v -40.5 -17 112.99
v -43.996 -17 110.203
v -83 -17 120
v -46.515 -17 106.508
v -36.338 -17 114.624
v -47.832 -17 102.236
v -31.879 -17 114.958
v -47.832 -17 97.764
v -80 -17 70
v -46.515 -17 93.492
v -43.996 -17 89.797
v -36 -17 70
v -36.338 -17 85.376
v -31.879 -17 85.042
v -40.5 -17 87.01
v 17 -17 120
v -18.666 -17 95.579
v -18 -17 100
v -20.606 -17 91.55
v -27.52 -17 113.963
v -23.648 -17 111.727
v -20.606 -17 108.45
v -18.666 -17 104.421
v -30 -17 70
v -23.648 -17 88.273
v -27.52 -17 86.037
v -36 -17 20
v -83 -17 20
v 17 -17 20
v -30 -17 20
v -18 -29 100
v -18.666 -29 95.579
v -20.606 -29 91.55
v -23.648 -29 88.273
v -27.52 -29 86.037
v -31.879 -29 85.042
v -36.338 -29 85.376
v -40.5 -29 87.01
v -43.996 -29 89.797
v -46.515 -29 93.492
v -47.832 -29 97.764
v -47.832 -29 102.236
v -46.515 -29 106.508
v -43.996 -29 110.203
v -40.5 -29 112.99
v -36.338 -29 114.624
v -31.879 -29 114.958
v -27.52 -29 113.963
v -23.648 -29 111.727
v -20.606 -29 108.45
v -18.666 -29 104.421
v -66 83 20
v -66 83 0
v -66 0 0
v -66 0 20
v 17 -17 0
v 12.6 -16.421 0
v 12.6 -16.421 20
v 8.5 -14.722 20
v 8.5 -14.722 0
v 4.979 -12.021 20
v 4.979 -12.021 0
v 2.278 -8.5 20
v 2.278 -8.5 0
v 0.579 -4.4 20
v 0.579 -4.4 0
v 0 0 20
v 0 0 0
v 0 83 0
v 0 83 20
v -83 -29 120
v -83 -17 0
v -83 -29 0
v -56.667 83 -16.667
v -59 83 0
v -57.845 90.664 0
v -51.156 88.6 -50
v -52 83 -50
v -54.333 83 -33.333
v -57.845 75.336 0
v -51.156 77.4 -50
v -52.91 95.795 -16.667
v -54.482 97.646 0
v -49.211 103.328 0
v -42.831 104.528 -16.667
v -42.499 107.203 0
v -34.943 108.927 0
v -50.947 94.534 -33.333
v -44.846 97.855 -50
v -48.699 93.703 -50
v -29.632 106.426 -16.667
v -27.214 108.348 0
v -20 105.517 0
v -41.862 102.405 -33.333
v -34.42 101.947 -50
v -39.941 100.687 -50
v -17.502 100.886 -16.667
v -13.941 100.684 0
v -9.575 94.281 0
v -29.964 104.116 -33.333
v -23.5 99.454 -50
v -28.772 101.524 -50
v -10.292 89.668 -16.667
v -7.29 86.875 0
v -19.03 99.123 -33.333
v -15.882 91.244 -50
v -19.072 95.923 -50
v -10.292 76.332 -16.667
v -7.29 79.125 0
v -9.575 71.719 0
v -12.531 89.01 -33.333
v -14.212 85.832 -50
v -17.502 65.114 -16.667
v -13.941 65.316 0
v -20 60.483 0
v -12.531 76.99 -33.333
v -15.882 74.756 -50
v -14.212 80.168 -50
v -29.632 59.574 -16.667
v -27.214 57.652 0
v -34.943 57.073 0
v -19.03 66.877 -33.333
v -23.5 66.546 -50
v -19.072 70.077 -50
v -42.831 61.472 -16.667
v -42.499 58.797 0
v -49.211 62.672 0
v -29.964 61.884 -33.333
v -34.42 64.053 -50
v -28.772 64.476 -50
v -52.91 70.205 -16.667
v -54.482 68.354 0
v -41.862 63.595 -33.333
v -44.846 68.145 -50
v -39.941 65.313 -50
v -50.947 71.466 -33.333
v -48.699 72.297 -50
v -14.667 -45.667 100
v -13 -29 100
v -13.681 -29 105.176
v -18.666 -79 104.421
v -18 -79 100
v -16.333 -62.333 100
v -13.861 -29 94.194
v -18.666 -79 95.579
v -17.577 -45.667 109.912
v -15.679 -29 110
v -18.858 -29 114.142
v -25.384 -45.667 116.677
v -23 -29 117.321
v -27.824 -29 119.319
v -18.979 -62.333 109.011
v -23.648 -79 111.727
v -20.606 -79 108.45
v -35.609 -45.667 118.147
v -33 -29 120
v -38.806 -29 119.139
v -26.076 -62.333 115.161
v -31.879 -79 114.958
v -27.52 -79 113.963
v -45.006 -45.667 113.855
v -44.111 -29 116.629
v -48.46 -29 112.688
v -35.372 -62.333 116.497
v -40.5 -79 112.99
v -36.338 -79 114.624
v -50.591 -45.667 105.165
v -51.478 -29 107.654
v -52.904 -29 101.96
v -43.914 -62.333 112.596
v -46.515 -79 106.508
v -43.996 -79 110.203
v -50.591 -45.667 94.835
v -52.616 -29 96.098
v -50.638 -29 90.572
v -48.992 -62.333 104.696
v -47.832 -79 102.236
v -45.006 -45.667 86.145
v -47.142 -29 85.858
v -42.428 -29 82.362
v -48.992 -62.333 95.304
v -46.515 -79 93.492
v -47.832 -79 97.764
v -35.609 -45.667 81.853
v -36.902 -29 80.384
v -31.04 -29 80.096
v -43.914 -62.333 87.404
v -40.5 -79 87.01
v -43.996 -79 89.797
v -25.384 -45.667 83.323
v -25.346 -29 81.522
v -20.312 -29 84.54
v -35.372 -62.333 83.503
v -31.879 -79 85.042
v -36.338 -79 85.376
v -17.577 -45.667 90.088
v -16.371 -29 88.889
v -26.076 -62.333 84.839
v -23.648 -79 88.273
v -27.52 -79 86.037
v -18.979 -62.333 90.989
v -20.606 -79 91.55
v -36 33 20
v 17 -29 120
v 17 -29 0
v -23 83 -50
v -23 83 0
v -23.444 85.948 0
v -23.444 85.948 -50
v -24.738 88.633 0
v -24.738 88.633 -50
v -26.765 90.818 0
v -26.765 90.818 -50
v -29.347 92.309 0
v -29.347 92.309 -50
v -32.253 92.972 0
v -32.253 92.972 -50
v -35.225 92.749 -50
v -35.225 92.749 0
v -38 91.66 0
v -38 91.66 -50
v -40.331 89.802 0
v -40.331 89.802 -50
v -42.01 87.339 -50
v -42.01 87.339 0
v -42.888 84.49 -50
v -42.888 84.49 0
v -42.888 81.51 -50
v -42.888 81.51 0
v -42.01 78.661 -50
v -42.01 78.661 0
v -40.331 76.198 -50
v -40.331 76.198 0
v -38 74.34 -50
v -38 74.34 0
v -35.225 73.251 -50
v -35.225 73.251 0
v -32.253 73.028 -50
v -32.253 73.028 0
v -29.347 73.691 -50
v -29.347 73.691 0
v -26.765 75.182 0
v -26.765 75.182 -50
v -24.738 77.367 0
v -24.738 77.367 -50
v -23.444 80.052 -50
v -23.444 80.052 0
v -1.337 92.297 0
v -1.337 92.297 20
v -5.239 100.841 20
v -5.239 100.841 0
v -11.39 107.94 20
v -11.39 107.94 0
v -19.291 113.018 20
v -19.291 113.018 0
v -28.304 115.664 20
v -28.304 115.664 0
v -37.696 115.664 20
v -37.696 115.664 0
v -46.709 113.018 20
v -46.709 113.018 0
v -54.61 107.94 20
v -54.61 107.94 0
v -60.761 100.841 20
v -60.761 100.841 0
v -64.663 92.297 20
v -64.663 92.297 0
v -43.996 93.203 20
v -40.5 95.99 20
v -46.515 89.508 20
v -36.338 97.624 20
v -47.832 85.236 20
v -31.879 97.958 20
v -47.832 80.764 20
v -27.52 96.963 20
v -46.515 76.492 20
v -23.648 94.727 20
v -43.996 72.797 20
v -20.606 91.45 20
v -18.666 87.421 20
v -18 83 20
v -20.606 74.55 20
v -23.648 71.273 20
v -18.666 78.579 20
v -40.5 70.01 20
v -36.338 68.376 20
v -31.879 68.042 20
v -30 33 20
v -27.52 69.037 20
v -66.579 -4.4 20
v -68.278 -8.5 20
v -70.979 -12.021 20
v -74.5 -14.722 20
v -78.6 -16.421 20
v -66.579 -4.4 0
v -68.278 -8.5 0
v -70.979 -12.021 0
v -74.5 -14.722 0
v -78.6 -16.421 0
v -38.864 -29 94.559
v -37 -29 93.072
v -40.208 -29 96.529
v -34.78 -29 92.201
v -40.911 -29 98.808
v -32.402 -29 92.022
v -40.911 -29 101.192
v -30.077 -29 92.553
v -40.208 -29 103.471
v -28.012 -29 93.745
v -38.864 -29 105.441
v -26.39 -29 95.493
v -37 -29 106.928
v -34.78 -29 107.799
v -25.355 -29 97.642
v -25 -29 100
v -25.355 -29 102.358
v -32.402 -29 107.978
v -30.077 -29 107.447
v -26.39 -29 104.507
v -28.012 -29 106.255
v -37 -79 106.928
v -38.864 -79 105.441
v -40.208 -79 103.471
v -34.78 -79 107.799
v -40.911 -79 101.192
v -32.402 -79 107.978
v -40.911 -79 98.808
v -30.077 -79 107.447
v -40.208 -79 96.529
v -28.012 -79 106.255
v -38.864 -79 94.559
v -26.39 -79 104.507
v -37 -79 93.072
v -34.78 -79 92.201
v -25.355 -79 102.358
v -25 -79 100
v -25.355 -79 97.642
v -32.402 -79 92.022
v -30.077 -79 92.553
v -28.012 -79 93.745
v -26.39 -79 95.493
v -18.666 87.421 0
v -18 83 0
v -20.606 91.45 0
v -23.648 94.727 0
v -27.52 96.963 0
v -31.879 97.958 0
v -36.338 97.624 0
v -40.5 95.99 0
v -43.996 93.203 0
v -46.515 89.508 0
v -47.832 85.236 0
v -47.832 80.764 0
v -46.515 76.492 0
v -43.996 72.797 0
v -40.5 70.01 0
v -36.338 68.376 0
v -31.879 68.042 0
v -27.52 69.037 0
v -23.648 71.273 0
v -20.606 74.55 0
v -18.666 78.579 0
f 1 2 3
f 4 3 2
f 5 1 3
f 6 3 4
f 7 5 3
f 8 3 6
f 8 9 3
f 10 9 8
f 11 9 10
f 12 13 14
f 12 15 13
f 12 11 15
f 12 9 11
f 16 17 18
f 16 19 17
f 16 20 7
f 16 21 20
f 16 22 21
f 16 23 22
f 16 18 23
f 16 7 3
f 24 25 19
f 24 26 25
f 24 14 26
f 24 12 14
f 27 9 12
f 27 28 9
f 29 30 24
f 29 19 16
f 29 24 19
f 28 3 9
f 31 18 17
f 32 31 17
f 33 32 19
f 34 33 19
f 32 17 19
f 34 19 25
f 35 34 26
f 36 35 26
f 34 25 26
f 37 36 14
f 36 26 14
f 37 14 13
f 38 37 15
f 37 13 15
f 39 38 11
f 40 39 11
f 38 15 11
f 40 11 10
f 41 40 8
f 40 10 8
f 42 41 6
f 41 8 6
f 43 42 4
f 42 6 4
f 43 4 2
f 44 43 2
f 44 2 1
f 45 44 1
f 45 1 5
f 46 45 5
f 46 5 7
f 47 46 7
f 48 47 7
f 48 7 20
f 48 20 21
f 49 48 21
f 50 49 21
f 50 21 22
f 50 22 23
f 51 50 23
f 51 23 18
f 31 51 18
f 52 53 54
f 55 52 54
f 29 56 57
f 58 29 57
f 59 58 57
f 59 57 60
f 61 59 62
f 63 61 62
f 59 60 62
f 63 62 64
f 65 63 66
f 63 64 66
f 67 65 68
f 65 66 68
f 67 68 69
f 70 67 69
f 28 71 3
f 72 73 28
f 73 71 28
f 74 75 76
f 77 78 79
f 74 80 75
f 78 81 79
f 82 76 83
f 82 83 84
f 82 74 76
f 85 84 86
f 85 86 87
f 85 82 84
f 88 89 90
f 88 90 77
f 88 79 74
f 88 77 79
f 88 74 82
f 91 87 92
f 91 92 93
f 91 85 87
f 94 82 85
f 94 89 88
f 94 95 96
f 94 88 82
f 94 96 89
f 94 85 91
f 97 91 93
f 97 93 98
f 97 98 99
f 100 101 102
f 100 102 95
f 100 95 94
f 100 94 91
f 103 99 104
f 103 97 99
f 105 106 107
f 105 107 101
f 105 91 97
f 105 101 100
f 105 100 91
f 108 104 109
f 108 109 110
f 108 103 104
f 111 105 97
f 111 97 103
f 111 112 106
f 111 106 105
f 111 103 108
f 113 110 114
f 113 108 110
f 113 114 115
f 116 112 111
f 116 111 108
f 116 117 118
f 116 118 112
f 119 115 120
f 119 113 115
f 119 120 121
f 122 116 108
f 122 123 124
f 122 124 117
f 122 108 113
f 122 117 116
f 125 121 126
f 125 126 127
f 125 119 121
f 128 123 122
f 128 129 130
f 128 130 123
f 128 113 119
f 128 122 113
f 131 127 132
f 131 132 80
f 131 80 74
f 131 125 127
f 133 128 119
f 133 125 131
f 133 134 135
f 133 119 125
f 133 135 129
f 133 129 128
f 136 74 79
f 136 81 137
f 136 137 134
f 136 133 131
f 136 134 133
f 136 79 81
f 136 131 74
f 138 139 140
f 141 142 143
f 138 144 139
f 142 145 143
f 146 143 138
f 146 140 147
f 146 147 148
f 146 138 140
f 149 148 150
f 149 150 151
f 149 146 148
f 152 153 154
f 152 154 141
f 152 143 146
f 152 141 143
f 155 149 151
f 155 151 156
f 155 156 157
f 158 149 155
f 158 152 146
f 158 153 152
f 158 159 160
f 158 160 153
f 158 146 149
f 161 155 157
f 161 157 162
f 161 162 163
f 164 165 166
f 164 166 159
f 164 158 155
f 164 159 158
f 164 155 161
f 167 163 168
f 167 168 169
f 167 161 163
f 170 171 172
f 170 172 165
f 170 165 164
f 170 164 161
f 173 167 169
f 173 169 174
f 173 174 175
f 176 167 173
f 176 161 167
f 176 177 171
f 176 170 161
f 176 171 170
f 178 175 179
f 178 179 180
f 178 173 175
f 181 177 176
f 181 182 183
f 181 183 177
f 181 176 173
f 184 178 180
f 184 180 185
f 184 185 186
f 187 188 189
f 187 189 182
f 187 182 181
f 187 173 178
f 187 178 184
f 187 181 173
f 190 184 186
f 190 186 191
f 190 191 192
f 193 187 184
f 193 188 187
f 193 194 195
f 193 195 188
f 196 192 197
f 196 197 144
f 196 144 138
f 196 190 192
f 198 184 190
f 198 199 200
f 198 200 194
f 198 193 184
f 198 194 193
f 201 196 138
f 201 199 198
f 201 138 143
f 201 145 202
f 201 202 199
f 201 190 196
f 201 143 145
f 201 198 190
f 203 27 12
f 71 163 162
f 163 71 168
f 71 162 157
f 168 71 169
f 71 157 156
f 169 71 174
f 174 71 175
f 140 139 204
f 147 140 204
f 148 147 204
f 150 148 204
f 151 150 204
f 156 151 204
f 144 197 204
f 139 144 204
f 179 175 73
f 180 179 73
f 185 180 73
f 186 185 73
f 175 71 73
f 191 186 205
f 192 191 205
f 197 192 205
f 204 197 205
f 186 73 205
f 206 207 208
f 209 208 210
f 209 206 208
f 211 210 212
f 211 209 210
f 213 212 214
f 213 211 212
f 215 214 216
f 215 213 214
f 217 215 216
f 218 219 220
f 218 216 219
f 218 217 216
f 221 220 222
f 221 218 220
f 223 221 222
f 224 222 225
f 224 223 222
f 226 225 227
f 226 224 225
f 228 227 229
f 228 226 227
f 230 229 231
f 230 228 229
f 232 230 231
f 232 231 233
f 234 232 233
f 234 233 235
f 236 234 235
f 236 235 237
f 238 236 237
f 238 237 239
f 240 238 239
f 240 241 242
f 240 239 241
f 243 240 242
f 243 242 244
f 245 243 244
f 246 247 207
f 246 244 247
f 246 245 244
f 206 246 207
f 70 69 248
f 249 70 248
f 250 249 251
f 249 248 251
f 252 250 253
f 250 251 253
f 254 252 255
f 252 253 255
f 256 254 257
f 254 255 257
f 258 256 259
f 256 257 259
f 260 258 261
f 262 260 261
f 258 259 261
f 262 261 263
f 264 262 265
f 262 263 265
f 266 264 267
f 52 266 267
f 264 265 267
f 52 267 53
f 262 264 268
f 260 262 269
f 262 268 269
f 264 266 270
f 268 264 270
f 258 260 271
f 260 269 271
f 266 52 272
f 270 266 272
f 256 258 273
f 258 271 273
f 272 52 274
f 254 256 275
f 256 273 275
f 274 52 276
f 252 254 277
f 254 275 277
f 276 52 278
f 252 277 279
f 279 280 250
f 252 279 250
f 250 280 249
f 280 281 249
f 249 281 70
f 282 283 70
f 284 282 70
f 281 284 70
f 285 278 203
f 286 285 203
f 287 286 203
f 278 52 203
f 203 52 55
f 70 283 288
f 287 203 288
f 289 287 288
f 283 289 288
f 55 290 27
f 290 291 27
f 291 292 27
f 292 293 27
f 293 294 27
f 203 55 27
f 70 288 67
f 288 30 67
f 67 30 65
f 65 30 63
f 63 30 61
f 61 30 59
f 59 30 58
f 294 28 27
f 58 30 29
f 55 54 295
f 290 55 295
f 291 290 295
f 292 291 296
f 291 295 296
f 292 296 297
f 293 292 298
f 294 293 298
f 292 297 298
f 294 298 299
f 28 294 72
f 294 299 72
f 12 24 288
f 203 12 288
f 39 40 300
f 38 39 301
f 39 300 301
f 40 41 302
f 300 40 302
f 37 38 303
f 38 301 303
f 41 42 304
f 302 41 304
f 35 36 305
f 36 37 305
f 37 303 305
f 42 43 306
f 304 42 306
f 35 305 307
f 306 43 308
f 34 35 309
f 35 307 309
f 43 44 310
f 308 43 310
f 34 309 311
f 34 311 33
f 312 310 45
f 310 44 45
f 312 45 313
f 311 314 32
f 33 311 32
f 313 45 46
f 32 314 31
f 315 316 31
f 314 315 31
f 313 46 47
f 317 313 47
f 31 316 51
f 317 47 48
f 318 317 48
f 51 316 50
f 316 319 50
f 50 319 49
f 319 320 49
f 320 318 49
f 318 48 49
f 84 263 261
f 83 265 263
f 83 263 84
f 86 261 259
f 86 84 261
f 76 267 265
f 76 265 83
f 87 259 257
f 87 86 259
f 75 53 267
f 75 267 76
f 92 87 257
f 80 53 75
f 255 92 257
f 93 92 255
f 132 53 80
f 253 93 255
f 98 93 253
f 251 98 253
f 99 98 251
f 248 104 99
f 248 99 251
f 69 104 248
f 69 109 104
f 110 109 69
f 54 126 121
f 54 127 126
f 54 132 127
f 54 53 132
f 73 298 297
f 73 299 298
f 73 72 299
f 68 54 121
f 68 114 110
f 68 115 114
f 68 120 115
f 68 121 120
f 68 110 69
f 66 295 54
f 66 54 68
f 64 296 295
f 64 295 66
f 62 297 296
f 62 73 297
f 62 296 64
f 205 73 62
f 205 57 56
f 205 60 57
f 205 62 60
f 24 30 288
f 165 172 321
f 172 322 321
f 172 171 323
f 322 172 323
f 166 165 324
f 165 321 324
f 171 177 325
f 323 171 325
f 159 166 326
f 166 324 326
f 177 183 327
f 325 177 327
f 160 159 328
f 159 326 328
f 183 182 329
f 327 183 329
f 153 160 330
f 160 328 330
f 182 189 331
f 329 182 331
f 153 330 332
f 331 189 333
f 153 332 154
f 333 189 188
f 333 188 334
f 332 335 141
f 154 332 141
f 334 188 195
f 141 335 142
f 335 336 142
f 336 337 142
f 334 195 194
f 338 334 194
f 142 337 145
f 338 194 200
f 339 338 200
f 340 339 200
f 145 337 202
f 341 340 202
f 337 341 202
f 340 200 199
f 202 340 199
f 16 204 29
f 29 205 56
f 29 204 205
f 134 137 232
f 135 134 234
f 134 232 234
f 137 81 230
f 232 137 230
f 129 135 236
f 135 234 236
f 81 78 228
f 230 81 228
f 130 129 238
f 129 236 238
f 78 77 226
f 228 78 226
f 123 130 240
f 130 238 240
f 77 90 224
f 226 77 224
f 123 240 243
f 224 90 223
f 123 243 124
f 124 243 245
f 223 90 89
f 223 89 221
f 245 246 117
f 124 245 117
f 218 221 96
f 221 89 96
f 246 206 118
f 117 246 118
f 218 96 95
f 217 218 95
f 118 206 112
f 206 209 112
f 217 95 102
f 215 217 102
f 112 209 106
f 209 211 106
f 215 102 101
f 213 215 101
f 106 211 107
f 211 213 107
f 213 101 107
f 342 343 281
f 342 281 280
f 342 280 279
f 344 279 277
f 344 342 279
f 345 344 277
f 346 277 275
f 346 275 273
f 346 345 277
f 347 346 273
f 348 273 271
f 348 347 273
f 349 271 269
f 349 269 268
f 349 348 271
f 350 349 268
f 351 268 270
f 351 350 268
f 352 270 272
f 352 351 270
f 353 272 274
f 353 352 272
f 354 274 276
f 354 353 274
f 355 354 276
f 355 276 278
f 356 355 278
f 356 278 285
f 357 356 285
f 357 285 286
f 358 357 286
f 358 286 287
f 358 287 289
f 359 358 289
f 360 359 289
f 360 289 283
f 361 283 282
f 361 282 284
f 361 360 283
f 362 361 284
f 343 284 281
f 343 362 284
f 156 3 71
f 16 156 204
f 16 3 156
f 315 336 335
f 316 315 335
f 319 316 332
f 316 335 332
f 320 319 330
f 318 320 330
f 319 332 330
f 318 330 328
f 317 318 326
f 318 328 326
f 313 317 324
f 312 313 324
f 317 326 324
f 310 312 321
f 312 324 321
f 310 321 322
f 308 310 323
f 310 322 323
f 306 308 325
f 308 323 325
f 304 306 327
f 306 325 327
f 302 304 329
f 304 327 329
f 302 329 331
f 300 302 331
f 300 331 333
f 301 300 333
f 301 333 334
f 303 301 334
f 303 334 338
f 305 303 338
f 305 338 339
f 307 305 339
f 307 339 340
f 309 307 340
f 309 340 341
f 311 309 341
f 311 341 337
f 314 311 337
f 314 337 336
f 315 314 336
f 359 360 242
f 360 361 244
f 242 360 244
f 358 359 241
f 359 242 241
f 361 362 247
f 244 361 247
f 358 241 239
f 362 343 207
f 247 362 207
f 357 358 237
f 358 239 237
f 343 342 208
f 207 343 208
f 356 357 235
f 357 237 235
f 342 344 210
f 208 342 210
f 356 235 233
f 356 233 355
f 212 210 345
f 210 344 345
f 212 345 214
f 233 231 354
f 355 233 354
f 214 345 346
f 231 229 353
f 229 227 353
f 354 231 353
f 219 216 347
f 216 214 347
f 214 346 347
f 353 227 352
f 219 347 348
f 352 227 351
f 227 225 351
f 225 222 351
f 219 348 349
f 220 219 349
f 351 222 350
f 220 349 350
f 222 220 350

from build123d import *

# Parameters (mm, degrees)
CROQUIS2_R              = 15
SALIENTE_EXTRUIR1_DEPTH = 20
CROQUIS5_R              = 26
CROQUIS4_R              = 19
CORTAR_EXTRUIR1_REACH   = 160.887
CROQUIS4_7_R            = 10
SALIENTE_EXTRUIR2_REACH = 176.396
CROQUIS8_W              = 100
CROQUIS8_H              = 20
CROQUIS9_W              = 100
CROQUIS9_H              = 12
SALIENTE_EXTRUIR3_DEPTH = 125
CROQUIS11_W             = 6
CROQUIS11_H             = 50
SALIENTE_EXTRUIR4_DEPTH = 50
CORTAR_EXTRUIR2_DEPTH   = 50
CORTAR_EXTRUIR3_REACH   = 215.549
CROQUIS13_R             = 15
CORTAR_EXTRUIR4_REACH   = 215.549
CROQUIS18_W             = 100
CROQUIS18_H             = 25
CROQUIS20_R             = 20
CROQUIS15_R             = 15
CORTAR_EXTRUIR5_REACH   = 245.545
CROQUIS22_R             = 8


with BuildPart() as part:
    # Croquis2 → Saliente-Extruir1 (new body)
    with BuildSketch(Plane.XY):
        with BuildLine():
            Line((-66, 83), (-66, 0))
            ThreePointArc((-66, 0), (-70.97918472, -12.02081528), (-83, -17))
            Line((-83, -17), (17, -17))
            ThreePointArc((17, -17), (4.97918472, -12.02081528), (0, 0))
            Line((0, 0), (0, 83))
            ThreePointArc((0, 83), (-33, 116), (-66, 83))
        make_face()
        with Locations((-33, 83)):
            Circle(CROQUIS2_R, mode=Mode.SUBTRACT)
    extrude(amount=SALIENTE_EXTRUIR1_DEPTH)

    # Croquis5 → Recubrir2 section 0
    with BuildSketch(Plane(origin=(0, 0, 0), x_dir=(-1, 0, 0), z_dir=(0, 0, -1))):
        with Locations((33, 83)):
            Circle(CROQUIS5_R)
    # Croquis4 → Recubrir2 section 1
    with BuildSketch(Plane.XY.offset(-50)):
        with Locations((-33, 83)):
            Circle(CROQUIS4_R)
    loft()

    # Croquis4<7> → Cortar-Extruir1 (cut, up to next)
    with BuildSketch(Plane.XY.offset(-50), mode=Mode.PRIVATE) as cortar_extruir1_sk1:
        with Locations((-33, 83)):
            Circle(CROQUIS4_7_R)
    cortar_extruir1_tool1 = extrude(cortar_extruir1_sk1.sketch, amount=CORTAR_EXTRUIR1_REACH, mode=Mode.PRIVATE) & part.part
    add(cortar_extruir1_tool1.solids().sort_by_distance((-33, 83, -50))[0], mode=Mode.SUBTRACT)

    # Croquis8 → Saliente-Extruir2 (add, up to next)
    with BuildSketch(Plane(origin=(0, -29, 0), x_dir=(1, 0, 0), z_dir=(0, 1, 0)), mode=Mode.PRIVATE) as saliente_extruir2_sk1:
        with Locations((-33, -10)):
            Rectangle(CROQUIS8_W, CROQUIS8_H)
    saliente_extruir2_tool1 = extrude(saliente_extruir2_sk1.sketch, amount=SALIENTE_EXTRUIR2_REACH, mode=Mode.PRIVATE) - part.part
    add(saliente_extruir2_tool1.solids().sort_by_distance((-33, -29, 10))[0])

    # Croquis9 → Saliente-Extruir3 (add)
    with BuildSketch(Plane.XY.offset(20)):
        with Locations((-33, -23)):
            Rectangle(CROQUIS9_W, CROQUIS9_H)
    extrude(amount=SALIENTE_EXTRUIR3_DEPTH)

    # Croquis11 → Saliente-Extruir4 (add)
    with BuildSketch(Plane.XY.offset(20)):
        with Locations((-33, 8)):
            Rectangle(CROQUIS11_W, CROQUIS11_H)
    extrude(amount=SALIENTE_EXTRUIR4_DEPTH)

    # Croquis12 → Cortar-Extruir2 (cut)
    with BuildSketch(Plane(origin=(-30, 0, 0), x_dir=(0, 0, -1), z_dir=(1, 0, 0))):
        Polygon((-70, -17), (-20, 33), (-70, 33), align=None)
    extrude(amount=-CORTAR_EXTRUIR2_DEPTH, mode=Mode.SUBTRACT)

    # Croquis13 → Cortar-Extruir3 (cut, up to next)
    with BuildSketch(Plane(origin=(0, -17, 0), x_dir=(1, 0, 0), z_dir=(0, 1, 0)), mode=Mode.PRIVATE) as cortar_extruir3_sk1:
        with Locations((-33, -100)):
            Circle(CROQUIS13_R)
    cortar_extruir3_tool1 = extrude(cortar_extruir3_sk1.sketch, amount=-CORTAR_EXTRUIR3_REACH, mode=Mode.PRIVATE) & part.part
    add(cortar_extruir3_tool1.solids().sort_by_distance((-33, -17, 100))[0], mode=Mode.SUBTRACT)

    # Croquis18 → Cortar-Extruir4 (cut, up to next)
    with BuildSketch(Plane(origin=(0, -17, 0), x_dir=(1, 0, 0), z_dir=(0, 1, 0)), mode=Mode.PRIVATE) as cortar_extruir4_sk1:
        with Locations((-33, -132.5)):
            Rectangle(CROQUIS18_W, CROQUIS18_H)
    cortar_extruir4_tool1 = extrude(cortar_extruir4_sk1.sketch, amount=-CORTAR_EXTRUIR4_REACH, mode=Mode.PRIVATE) & part.part
    add(cortar_extruir4_tool1.solids().sort_by_distance((-33, -17, 132.5))[0], mode=Mode.SUBTRACT)

    # Croquis20 → Recubrir6 section 0
    with BuildSketch(Plane.XZ.offset(29)):
        with Locations((-33, 100)):
            Circle(CROQUIS20_R)
    # Croquis15 → Recubrir6 section 1
    with BuildSketch(Plane(origin=(0, -79, 0), x_dir=(1, 0, 0), z_dir=(0, 1, 0))):
        with Locations((-33, -100)):
            Circle(CROQUIS15_R)
    loft()

    # Croquis22 → Cortar-Extruir5 (cut, up to next)
    with BuildSketch(Plane.XZ.offset(79), mode=Mode.PRIVATE) as cortar_extruir5_sk1:
        with Locations((-33, 100)):
            Circle(CROQUIS22_R)
    cortar_extruir5_tool1 = extrude(cortar_extruir5_sk1.sketch, amount=-CORTAR_EXTRUIR5_REACH, mode=Mode.PRIVATE) & part.part
    add(cortar_extruir5_tool1.solids().sort_by_distance((-33, -79, 100))[0], mode=Mode.SUBTRACT)


solid = part.part
